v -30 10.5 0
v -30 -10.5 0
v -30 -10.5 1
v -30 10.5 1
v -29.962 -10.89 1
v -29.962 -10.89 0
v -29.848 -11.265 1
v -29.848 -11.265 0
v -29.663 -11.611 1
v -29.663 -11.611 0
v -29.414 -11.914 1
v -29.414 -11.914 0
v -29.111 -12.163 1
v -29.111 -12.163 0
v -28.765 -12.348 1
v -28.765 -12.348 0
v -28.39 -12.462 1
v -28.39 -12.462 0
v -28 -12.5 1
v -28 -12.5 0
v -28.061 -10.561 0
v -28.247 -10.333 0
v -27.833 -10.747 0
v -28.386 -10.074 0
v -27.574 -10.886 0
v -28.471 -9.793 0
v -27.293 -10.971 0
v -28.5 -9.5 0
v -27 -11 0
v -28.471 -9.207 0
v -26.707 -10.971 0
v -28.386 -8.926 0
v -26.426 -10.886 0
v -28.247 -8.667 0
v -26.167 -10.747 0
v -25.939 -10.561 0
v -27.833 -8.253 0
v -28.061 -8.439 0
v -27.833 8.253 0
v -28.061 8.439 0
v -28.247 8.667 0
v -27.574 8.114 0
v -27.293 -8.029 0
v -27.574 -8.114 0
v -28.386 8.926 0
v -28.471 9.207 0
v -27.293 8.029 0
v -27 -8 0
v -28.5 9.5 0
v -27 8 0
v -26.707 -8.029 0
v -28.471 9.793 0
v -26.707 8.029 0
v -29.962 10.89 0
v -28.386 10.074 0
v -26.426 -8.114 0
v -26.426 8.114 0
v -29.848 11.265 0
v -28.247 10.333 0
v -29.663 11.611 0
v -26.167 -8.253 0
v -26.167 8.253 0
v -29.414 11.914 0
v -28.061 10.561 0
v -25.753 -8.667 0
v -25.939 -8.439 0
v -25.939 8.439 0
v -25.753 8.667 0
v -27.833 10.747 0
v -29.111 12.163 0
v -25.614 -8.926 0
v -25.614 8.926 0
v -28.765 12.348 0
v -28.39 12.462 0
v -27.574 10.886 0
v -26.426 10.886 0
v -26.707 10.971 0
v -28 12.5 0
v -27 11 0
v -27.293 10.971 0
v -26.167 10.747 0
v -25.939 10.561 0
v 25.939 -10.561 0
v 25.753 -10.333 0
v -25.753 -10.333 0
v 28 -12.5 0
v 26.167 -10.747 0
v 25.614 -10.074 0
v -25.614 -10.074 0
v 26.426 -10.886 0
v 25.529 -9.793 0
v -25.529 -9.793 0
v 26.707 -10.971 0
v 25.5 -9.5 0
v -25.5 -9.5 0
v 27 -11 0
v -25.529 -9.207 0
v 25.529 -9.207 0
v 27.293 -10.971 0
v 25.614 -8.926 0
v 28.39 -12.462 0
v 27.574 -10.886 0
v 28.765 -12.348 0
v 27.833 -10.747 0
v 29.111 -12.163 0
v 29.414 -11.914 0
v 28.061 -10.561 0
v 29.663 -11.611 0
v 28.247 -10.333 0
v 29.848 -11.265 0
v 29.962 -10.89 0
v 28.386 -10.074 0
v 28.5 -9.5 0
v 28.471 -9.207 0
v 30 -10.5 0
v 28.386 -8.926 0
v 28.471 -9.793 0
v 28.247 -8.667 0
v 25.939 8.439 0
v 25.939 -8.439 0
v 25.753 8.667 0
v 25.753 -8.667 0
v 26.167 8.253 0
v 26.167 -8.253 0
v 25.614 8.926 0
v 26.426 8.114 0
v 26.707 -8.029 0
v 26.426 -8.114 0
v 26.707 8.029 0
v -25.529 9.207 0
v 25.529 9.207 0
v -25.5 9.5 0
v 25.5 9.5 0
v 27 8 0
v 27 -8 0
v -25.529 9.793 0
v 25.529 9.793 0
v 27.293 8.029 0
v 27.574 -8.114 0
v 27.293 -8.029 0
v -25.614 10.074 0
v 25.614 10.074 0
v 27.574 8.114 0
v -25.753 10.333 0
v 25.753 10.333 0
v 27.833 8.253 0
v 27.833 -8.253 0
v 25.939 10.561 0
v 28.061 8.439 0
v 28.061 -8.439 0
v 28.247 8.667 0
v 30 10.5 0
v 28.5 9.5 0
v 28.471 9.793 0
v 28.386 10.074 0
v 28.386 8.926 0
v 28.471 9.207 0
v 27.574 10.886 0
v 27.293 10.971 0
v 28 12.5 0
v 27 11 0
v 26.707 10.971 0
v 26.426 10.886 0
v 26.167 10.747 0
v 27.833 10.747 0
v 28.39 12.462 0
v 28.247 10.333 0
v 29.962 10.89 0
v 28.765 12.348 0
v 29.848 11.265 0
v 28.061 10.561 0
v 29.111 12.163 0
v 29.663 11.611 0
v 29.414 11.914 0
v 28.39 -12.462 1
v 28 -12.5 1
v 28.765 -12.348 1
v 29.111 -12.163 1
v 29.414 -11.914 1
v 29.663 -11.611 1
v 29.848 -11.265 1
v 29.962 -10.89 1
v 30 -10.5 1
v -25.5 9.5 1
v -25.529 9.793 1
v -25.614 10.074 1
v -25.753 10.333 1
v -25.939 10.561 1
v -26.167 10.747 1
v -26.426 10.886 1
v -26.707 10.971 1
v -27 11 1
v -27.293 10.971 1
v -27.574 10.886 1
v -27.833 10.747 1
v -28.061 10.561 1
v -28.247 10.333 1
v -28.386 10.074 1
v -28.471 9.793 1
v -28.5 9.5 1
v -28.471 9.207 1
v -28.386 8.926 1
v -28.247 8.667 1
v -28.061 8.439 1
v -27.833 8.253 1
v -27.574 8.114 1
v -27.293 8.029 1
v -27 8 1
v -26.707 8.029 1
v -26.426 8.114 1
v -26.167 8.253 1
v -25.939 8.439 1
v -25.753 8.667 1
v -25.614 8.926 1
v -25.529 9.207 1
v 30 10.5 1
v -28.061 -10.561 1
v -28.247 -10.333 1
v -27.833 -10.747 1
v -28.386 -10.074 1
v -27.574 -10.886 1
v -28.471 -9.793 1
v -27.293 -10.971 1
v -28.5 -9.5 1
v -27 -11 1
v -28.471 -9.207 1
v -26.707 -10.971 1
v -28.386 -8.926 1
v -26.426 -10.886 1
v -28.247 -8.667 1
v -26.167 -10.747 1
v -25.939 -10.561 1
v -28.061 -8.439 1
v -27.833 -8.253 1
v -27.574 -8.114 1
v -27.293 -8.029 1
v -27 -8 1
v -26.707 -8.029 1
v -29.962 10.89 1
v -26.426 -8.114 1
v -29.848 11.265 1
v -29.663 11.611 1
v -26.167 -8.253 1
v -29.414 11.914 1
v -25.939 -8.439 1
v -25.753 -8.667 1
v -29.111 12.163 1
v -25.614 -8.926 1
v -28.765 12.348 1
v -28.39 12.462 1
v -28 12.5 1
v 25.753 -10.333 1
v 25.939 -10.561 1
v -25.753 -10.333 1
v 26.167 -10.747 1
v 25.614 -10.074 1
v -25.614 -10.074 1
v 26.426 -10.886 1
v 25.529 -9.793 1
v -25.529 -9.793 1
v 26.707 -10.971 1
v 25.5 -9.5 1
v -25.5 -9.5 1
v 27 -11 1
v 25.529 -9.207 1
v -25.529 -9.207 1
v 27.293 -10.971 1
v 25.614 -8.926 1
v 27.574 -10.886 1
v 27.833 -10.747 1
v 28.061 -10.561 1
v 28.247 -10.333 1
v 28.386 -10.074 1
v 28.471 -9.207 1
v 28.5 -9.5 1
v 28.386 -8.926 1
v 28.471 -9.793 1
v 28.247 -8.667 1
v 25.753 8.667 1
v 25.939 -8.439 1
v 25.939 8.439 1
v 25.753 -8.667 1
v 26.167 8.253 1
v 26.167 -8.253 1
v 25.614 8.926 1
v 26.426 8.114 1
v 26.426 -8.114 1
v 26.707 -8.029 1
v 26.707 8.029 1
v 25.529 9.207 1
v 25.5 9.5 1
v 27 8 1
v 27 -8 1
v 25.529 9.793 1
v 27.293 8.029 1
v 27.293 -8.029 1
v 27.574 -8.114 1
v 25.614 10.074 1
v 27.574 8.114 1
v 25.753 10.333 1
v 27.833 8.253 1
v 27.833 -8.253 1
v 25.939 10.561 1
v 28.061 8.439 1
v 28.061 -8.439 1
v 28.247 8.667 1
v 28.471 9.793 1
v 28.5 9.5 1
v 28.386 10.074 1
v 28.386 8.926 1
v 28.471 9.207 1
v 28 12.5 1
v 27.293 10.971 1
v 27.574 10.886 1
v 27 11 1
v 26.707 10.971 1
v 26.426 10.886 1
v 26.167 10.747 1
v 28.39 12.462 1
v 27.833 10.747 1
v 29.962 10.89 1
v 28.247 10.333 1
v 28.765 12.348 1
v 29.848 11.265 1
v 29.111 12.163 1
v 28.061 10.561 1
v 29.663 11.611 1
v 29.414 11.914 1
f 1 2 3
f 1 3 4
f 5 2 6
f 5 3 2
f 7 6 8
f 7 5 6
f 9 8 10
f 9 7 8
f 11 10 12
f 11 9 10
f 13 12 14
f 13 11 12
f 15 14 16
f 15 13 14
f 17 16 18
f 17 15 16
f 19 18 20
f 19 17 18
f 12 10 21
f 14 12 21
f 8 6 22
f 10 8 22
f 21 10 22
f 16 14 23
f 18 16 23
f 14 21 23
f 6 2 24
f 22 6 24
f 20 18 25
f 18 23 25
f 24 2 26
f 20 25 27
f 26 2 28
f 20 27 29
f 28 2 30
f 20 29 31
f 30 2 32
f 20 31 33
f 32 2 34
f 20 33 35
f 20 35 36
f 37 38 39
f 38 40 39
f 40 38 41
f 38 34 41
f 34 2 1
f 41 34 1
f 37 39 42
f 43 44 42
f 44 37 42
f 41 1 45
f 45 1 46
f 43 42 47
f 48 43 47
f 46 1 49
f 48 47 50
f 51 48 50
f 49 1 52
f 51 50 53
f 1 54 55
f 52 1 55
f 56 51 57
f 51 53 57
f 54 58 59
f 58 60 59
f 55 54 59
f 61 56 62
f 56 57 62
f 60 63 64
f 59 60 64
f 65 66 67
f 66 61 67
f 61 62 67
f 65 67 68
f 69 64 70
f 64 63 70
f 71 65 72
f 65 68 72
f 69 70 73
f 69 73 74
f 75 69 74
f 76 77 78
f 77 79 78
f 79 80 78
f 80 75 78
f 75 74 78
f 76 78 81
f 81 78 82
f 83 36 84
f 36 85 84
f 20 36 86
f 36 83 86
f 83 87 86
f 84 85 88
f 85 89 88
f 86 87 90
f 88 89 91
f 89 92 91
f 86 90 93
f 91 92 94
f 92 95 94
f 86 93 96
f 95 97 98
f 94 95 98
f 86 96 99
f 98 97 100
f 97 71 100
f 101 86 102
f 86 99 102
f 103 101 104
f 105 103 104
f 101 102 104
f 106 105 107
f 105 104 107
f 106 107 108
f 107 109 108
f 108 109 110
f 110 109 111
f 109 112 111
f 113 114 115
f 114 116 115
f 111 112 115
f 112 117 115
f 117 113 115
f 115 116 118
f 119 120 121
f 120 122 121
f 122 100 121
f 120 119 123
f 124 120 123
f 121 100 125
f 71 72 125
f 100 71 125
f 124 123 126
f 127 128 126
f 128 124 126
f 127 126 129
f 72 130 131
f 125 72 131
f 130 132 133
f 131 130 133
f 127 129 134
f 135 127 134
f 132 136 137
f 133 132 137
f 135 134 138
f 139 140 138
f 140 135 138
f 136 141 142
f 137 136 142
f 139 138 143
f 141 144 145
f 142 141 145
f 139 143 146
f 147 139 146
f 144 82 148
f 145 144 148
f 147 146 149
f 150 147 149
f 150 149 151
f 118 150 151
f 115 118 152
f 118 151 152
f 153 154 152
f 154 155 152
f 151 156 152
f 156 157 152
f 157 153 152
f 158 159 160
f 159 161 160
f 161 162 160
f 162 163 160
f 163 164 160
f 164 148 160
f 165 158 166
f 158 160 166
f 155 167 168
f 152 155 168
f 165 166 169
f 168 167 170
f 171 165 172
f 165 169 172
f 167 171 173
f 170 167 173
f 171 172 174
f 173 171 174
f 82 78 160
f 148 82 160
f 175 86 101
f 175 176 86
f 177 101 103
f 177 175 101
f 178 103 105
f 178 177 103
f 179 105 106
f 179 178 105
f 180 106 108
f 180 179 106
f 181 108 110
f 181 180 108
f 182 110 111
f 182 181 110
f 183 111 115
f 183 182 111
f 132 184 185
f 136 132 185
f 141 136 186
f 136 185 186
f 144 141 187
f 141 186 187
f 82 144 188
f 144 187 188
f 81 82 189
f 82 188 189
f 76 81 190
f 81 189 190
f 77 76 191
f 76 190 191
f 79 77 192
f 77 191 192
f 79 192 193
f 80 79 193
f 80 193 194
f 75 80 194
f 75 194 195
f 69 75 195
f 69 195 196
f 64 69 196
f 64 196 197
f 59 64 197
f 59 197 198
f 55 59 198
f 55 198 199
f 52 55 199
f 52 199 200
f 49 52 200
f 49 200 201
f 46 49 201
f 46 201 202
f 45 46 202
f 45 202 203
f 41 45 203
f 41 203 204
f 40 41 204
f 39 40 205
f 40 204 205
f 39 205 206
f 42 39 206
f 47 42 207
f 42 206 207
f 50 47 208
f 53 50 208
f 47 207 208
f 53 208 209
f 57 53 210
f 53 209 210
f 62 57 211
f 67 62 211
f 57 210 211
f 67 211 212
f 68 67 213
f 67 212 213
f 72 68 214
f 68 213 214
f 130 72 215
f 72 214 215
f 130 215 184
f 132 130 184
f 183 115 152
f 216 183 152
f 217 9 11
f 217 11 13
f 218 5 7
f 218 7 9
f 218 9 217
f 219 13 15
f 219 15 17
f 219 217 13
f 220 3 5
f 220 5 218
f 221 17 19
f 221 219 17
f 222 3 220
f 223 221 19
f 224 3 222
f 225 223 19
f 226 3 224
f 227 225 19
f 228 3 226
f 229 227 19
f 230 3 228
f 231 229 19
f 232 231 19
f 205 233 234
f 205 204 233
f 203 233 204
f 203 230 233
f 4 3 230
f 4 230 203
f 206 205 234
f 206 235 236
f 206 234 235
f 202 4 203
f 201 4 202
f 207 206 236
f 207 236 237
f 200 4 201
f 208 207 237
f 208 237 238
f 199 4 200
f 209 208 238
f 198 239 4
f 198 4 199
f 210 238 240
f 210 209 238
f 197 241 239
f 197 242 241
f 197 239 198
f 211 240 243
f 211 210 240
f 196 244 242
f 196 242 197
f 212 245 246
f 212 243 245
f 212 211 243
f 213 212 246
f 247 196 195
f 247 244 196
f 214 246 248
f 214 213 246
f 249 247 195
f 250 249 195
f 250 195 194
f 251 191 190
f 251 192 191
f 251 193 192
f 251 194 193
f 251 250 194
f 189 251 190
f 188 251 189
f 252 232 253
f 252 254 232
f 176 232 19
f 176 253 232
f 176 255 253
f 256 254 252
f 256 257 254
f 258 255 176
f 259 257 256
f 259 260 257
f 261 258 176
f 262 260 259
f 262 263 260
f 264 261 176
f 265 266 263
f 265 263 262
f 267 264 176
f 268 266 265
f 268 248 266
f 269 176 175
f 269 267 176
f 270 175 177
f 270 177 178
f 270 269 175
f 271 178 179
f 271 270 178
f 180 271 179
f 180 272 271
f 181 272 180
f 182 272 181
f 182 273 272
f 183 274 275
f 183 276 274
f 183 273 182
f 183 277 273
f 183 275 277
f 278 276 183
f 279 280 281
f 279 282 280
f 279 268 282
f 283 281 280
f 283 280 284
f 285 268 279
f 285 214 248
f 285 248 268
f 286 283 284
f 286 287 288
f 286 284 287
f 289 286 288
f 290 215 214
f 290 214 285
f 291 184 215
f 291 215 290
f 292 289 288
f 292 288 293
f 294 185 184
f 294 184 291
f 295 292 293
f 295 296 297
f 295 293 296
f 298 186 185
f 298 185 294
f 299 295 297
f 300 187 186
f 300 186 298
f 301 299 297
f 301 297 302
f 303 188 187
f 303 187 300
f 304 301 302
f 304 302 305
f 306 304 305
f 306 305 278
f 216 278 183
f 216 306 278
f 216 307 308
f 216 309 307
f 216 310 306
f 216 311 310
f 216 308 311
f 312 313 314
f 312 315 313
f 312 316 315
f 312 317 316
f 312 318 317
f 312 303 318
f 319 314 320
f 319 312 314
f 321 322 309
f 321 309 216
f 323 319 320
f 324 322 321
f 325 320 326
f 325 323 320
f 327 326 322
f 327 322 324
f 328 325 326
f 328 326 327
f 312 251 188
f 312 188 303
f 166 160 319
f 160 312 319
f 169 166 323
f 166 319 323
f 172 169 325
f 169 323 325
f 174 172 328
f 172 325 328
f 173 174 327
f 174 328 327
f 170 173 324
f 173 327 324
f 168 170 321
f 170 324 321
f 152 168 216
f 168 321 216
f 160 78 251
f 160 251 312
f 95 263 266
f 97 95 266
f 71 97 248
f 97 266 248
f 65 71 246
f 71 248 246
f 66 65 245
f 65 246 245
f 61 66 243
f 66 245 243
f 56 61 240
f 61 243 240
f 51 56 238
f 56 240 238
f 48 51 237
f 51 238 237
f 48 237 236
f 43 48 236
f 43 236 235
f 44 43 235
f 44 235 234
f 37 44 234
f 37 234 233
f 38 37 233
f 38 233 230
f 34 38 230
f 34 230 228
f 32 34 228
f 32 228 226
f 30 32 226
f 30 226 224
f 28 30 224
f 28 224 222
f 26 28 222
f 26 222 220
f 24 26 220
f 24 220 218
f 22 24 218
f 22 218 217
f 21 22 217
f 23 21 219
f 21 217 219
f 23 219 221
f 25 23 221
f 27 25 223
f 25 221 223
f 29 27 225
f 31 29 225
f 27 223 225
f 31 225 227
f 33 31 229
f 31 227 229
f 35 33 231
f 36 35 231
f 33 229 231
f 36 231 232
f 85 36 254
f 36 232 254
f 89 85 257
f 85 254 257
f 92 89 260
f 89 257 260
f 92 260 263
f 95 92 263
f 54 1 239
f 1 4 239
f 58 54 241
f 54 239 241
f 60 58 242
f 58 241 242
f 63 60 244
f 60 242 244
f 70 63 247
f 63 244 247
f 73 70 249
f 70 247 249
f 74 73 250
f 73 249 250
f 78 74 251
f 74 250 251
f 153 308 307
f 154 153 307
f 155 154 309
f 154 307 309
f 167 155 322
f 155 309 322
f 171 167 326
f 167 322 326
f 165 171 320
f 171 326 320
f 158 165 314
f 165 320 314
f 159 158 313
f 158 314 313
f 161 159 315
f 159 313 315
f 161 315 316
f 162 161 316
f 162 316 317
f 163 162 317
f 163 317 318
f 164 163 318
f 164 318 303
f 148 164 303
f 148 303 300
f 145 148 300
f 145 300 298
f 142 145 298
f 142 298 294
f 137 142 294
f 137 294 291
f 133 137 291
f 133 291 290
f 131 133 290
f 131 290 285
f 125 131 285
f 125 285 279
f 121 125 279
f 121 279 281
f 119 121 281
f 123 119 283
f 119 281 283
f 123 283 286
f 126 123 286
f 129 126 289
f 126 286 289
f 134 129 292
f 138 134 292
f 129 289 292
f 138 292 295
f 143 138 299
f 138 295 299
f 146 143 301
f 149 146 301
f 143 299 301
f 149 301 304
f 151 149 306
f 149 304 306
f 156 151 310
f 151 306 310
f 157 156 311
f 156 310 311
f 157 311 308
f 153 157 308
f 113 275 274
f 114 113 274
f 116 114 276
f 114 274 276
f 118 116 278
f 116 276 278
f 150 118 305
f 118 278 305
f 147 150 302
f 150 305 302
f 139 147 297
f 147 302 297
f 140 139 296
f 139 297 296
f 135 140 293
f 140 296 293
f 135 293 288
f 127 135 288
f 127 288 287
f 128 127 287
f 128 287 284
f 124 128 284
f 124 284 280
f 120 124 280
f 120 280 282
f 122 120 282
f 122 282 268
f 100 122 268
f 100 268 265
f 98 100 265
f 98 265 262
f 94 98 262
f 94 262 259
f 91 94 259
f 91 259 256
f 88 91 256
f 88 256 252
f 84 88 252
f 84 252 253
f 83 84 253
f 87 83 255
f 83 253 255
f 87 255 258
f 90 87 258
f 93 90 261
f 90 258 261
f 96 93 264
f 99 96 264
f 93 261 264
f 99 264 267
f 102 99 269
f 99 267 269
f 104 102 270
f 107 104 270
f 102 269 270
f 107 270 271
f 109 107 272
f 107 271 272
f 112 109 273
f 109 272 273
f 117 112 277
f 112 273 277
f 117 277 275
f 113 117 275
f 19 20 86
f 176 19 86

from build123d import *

# Parameters (mm, degrees)
SKETCH_1_W          = 60
SKETCH_1_H          = 25
EXTRUDE_1_DEPTH     = 1
SKETCH_2_R          = 1.5
CUT_EXTRUDE_1_DEPTH = 2
FILLET_1_R          = 2


with BuildPart() as part:
    # ｽｹｯﾁ1 → ﾎﾞｽ - 押し出し1 (new body)
    with BuildSketch(Plane.XY):
        Rectangle(SKETCH_1_W, SKETCH_1_H)
    extrude(amount=EXTRUDE_1_DEPTH)

    # ｽｹｯﾁ2 → ｶｯﾄ - 押し出し1 (cut, through all)
    with BuildSketch(Plane.XY.offset(1)):
        with Locations((-27, 9.5)):
            Circle(SKETCH_2_R)
        with Locations((27, 9.5)):
            Circle(SKETCH_2_R)
        with Locations((-27, -9.5)):
            Circle(SKETCH_2_R)
        with Locations((27, -9.5)):
            Circle(SKETCH_2_R)
    extrude(amount=-CUT_EXTRUDE_1_DEPTH, mode=Mode.SUBTRACT)

    # ﾌｨﾚｯﾄ1
    fillet_1_edges = [part.edges().sort_by_distance(p)[0] for p in [
        (-30, 12.5, 0.5),
        (30, 12.5, 0.5),
        (30, -12.5, 0.5),
        (-30, -12.5, 0.5),
    ]]
    fillet(fillet_1_edges, radius=FILLET_1_R)


solid = part.part
